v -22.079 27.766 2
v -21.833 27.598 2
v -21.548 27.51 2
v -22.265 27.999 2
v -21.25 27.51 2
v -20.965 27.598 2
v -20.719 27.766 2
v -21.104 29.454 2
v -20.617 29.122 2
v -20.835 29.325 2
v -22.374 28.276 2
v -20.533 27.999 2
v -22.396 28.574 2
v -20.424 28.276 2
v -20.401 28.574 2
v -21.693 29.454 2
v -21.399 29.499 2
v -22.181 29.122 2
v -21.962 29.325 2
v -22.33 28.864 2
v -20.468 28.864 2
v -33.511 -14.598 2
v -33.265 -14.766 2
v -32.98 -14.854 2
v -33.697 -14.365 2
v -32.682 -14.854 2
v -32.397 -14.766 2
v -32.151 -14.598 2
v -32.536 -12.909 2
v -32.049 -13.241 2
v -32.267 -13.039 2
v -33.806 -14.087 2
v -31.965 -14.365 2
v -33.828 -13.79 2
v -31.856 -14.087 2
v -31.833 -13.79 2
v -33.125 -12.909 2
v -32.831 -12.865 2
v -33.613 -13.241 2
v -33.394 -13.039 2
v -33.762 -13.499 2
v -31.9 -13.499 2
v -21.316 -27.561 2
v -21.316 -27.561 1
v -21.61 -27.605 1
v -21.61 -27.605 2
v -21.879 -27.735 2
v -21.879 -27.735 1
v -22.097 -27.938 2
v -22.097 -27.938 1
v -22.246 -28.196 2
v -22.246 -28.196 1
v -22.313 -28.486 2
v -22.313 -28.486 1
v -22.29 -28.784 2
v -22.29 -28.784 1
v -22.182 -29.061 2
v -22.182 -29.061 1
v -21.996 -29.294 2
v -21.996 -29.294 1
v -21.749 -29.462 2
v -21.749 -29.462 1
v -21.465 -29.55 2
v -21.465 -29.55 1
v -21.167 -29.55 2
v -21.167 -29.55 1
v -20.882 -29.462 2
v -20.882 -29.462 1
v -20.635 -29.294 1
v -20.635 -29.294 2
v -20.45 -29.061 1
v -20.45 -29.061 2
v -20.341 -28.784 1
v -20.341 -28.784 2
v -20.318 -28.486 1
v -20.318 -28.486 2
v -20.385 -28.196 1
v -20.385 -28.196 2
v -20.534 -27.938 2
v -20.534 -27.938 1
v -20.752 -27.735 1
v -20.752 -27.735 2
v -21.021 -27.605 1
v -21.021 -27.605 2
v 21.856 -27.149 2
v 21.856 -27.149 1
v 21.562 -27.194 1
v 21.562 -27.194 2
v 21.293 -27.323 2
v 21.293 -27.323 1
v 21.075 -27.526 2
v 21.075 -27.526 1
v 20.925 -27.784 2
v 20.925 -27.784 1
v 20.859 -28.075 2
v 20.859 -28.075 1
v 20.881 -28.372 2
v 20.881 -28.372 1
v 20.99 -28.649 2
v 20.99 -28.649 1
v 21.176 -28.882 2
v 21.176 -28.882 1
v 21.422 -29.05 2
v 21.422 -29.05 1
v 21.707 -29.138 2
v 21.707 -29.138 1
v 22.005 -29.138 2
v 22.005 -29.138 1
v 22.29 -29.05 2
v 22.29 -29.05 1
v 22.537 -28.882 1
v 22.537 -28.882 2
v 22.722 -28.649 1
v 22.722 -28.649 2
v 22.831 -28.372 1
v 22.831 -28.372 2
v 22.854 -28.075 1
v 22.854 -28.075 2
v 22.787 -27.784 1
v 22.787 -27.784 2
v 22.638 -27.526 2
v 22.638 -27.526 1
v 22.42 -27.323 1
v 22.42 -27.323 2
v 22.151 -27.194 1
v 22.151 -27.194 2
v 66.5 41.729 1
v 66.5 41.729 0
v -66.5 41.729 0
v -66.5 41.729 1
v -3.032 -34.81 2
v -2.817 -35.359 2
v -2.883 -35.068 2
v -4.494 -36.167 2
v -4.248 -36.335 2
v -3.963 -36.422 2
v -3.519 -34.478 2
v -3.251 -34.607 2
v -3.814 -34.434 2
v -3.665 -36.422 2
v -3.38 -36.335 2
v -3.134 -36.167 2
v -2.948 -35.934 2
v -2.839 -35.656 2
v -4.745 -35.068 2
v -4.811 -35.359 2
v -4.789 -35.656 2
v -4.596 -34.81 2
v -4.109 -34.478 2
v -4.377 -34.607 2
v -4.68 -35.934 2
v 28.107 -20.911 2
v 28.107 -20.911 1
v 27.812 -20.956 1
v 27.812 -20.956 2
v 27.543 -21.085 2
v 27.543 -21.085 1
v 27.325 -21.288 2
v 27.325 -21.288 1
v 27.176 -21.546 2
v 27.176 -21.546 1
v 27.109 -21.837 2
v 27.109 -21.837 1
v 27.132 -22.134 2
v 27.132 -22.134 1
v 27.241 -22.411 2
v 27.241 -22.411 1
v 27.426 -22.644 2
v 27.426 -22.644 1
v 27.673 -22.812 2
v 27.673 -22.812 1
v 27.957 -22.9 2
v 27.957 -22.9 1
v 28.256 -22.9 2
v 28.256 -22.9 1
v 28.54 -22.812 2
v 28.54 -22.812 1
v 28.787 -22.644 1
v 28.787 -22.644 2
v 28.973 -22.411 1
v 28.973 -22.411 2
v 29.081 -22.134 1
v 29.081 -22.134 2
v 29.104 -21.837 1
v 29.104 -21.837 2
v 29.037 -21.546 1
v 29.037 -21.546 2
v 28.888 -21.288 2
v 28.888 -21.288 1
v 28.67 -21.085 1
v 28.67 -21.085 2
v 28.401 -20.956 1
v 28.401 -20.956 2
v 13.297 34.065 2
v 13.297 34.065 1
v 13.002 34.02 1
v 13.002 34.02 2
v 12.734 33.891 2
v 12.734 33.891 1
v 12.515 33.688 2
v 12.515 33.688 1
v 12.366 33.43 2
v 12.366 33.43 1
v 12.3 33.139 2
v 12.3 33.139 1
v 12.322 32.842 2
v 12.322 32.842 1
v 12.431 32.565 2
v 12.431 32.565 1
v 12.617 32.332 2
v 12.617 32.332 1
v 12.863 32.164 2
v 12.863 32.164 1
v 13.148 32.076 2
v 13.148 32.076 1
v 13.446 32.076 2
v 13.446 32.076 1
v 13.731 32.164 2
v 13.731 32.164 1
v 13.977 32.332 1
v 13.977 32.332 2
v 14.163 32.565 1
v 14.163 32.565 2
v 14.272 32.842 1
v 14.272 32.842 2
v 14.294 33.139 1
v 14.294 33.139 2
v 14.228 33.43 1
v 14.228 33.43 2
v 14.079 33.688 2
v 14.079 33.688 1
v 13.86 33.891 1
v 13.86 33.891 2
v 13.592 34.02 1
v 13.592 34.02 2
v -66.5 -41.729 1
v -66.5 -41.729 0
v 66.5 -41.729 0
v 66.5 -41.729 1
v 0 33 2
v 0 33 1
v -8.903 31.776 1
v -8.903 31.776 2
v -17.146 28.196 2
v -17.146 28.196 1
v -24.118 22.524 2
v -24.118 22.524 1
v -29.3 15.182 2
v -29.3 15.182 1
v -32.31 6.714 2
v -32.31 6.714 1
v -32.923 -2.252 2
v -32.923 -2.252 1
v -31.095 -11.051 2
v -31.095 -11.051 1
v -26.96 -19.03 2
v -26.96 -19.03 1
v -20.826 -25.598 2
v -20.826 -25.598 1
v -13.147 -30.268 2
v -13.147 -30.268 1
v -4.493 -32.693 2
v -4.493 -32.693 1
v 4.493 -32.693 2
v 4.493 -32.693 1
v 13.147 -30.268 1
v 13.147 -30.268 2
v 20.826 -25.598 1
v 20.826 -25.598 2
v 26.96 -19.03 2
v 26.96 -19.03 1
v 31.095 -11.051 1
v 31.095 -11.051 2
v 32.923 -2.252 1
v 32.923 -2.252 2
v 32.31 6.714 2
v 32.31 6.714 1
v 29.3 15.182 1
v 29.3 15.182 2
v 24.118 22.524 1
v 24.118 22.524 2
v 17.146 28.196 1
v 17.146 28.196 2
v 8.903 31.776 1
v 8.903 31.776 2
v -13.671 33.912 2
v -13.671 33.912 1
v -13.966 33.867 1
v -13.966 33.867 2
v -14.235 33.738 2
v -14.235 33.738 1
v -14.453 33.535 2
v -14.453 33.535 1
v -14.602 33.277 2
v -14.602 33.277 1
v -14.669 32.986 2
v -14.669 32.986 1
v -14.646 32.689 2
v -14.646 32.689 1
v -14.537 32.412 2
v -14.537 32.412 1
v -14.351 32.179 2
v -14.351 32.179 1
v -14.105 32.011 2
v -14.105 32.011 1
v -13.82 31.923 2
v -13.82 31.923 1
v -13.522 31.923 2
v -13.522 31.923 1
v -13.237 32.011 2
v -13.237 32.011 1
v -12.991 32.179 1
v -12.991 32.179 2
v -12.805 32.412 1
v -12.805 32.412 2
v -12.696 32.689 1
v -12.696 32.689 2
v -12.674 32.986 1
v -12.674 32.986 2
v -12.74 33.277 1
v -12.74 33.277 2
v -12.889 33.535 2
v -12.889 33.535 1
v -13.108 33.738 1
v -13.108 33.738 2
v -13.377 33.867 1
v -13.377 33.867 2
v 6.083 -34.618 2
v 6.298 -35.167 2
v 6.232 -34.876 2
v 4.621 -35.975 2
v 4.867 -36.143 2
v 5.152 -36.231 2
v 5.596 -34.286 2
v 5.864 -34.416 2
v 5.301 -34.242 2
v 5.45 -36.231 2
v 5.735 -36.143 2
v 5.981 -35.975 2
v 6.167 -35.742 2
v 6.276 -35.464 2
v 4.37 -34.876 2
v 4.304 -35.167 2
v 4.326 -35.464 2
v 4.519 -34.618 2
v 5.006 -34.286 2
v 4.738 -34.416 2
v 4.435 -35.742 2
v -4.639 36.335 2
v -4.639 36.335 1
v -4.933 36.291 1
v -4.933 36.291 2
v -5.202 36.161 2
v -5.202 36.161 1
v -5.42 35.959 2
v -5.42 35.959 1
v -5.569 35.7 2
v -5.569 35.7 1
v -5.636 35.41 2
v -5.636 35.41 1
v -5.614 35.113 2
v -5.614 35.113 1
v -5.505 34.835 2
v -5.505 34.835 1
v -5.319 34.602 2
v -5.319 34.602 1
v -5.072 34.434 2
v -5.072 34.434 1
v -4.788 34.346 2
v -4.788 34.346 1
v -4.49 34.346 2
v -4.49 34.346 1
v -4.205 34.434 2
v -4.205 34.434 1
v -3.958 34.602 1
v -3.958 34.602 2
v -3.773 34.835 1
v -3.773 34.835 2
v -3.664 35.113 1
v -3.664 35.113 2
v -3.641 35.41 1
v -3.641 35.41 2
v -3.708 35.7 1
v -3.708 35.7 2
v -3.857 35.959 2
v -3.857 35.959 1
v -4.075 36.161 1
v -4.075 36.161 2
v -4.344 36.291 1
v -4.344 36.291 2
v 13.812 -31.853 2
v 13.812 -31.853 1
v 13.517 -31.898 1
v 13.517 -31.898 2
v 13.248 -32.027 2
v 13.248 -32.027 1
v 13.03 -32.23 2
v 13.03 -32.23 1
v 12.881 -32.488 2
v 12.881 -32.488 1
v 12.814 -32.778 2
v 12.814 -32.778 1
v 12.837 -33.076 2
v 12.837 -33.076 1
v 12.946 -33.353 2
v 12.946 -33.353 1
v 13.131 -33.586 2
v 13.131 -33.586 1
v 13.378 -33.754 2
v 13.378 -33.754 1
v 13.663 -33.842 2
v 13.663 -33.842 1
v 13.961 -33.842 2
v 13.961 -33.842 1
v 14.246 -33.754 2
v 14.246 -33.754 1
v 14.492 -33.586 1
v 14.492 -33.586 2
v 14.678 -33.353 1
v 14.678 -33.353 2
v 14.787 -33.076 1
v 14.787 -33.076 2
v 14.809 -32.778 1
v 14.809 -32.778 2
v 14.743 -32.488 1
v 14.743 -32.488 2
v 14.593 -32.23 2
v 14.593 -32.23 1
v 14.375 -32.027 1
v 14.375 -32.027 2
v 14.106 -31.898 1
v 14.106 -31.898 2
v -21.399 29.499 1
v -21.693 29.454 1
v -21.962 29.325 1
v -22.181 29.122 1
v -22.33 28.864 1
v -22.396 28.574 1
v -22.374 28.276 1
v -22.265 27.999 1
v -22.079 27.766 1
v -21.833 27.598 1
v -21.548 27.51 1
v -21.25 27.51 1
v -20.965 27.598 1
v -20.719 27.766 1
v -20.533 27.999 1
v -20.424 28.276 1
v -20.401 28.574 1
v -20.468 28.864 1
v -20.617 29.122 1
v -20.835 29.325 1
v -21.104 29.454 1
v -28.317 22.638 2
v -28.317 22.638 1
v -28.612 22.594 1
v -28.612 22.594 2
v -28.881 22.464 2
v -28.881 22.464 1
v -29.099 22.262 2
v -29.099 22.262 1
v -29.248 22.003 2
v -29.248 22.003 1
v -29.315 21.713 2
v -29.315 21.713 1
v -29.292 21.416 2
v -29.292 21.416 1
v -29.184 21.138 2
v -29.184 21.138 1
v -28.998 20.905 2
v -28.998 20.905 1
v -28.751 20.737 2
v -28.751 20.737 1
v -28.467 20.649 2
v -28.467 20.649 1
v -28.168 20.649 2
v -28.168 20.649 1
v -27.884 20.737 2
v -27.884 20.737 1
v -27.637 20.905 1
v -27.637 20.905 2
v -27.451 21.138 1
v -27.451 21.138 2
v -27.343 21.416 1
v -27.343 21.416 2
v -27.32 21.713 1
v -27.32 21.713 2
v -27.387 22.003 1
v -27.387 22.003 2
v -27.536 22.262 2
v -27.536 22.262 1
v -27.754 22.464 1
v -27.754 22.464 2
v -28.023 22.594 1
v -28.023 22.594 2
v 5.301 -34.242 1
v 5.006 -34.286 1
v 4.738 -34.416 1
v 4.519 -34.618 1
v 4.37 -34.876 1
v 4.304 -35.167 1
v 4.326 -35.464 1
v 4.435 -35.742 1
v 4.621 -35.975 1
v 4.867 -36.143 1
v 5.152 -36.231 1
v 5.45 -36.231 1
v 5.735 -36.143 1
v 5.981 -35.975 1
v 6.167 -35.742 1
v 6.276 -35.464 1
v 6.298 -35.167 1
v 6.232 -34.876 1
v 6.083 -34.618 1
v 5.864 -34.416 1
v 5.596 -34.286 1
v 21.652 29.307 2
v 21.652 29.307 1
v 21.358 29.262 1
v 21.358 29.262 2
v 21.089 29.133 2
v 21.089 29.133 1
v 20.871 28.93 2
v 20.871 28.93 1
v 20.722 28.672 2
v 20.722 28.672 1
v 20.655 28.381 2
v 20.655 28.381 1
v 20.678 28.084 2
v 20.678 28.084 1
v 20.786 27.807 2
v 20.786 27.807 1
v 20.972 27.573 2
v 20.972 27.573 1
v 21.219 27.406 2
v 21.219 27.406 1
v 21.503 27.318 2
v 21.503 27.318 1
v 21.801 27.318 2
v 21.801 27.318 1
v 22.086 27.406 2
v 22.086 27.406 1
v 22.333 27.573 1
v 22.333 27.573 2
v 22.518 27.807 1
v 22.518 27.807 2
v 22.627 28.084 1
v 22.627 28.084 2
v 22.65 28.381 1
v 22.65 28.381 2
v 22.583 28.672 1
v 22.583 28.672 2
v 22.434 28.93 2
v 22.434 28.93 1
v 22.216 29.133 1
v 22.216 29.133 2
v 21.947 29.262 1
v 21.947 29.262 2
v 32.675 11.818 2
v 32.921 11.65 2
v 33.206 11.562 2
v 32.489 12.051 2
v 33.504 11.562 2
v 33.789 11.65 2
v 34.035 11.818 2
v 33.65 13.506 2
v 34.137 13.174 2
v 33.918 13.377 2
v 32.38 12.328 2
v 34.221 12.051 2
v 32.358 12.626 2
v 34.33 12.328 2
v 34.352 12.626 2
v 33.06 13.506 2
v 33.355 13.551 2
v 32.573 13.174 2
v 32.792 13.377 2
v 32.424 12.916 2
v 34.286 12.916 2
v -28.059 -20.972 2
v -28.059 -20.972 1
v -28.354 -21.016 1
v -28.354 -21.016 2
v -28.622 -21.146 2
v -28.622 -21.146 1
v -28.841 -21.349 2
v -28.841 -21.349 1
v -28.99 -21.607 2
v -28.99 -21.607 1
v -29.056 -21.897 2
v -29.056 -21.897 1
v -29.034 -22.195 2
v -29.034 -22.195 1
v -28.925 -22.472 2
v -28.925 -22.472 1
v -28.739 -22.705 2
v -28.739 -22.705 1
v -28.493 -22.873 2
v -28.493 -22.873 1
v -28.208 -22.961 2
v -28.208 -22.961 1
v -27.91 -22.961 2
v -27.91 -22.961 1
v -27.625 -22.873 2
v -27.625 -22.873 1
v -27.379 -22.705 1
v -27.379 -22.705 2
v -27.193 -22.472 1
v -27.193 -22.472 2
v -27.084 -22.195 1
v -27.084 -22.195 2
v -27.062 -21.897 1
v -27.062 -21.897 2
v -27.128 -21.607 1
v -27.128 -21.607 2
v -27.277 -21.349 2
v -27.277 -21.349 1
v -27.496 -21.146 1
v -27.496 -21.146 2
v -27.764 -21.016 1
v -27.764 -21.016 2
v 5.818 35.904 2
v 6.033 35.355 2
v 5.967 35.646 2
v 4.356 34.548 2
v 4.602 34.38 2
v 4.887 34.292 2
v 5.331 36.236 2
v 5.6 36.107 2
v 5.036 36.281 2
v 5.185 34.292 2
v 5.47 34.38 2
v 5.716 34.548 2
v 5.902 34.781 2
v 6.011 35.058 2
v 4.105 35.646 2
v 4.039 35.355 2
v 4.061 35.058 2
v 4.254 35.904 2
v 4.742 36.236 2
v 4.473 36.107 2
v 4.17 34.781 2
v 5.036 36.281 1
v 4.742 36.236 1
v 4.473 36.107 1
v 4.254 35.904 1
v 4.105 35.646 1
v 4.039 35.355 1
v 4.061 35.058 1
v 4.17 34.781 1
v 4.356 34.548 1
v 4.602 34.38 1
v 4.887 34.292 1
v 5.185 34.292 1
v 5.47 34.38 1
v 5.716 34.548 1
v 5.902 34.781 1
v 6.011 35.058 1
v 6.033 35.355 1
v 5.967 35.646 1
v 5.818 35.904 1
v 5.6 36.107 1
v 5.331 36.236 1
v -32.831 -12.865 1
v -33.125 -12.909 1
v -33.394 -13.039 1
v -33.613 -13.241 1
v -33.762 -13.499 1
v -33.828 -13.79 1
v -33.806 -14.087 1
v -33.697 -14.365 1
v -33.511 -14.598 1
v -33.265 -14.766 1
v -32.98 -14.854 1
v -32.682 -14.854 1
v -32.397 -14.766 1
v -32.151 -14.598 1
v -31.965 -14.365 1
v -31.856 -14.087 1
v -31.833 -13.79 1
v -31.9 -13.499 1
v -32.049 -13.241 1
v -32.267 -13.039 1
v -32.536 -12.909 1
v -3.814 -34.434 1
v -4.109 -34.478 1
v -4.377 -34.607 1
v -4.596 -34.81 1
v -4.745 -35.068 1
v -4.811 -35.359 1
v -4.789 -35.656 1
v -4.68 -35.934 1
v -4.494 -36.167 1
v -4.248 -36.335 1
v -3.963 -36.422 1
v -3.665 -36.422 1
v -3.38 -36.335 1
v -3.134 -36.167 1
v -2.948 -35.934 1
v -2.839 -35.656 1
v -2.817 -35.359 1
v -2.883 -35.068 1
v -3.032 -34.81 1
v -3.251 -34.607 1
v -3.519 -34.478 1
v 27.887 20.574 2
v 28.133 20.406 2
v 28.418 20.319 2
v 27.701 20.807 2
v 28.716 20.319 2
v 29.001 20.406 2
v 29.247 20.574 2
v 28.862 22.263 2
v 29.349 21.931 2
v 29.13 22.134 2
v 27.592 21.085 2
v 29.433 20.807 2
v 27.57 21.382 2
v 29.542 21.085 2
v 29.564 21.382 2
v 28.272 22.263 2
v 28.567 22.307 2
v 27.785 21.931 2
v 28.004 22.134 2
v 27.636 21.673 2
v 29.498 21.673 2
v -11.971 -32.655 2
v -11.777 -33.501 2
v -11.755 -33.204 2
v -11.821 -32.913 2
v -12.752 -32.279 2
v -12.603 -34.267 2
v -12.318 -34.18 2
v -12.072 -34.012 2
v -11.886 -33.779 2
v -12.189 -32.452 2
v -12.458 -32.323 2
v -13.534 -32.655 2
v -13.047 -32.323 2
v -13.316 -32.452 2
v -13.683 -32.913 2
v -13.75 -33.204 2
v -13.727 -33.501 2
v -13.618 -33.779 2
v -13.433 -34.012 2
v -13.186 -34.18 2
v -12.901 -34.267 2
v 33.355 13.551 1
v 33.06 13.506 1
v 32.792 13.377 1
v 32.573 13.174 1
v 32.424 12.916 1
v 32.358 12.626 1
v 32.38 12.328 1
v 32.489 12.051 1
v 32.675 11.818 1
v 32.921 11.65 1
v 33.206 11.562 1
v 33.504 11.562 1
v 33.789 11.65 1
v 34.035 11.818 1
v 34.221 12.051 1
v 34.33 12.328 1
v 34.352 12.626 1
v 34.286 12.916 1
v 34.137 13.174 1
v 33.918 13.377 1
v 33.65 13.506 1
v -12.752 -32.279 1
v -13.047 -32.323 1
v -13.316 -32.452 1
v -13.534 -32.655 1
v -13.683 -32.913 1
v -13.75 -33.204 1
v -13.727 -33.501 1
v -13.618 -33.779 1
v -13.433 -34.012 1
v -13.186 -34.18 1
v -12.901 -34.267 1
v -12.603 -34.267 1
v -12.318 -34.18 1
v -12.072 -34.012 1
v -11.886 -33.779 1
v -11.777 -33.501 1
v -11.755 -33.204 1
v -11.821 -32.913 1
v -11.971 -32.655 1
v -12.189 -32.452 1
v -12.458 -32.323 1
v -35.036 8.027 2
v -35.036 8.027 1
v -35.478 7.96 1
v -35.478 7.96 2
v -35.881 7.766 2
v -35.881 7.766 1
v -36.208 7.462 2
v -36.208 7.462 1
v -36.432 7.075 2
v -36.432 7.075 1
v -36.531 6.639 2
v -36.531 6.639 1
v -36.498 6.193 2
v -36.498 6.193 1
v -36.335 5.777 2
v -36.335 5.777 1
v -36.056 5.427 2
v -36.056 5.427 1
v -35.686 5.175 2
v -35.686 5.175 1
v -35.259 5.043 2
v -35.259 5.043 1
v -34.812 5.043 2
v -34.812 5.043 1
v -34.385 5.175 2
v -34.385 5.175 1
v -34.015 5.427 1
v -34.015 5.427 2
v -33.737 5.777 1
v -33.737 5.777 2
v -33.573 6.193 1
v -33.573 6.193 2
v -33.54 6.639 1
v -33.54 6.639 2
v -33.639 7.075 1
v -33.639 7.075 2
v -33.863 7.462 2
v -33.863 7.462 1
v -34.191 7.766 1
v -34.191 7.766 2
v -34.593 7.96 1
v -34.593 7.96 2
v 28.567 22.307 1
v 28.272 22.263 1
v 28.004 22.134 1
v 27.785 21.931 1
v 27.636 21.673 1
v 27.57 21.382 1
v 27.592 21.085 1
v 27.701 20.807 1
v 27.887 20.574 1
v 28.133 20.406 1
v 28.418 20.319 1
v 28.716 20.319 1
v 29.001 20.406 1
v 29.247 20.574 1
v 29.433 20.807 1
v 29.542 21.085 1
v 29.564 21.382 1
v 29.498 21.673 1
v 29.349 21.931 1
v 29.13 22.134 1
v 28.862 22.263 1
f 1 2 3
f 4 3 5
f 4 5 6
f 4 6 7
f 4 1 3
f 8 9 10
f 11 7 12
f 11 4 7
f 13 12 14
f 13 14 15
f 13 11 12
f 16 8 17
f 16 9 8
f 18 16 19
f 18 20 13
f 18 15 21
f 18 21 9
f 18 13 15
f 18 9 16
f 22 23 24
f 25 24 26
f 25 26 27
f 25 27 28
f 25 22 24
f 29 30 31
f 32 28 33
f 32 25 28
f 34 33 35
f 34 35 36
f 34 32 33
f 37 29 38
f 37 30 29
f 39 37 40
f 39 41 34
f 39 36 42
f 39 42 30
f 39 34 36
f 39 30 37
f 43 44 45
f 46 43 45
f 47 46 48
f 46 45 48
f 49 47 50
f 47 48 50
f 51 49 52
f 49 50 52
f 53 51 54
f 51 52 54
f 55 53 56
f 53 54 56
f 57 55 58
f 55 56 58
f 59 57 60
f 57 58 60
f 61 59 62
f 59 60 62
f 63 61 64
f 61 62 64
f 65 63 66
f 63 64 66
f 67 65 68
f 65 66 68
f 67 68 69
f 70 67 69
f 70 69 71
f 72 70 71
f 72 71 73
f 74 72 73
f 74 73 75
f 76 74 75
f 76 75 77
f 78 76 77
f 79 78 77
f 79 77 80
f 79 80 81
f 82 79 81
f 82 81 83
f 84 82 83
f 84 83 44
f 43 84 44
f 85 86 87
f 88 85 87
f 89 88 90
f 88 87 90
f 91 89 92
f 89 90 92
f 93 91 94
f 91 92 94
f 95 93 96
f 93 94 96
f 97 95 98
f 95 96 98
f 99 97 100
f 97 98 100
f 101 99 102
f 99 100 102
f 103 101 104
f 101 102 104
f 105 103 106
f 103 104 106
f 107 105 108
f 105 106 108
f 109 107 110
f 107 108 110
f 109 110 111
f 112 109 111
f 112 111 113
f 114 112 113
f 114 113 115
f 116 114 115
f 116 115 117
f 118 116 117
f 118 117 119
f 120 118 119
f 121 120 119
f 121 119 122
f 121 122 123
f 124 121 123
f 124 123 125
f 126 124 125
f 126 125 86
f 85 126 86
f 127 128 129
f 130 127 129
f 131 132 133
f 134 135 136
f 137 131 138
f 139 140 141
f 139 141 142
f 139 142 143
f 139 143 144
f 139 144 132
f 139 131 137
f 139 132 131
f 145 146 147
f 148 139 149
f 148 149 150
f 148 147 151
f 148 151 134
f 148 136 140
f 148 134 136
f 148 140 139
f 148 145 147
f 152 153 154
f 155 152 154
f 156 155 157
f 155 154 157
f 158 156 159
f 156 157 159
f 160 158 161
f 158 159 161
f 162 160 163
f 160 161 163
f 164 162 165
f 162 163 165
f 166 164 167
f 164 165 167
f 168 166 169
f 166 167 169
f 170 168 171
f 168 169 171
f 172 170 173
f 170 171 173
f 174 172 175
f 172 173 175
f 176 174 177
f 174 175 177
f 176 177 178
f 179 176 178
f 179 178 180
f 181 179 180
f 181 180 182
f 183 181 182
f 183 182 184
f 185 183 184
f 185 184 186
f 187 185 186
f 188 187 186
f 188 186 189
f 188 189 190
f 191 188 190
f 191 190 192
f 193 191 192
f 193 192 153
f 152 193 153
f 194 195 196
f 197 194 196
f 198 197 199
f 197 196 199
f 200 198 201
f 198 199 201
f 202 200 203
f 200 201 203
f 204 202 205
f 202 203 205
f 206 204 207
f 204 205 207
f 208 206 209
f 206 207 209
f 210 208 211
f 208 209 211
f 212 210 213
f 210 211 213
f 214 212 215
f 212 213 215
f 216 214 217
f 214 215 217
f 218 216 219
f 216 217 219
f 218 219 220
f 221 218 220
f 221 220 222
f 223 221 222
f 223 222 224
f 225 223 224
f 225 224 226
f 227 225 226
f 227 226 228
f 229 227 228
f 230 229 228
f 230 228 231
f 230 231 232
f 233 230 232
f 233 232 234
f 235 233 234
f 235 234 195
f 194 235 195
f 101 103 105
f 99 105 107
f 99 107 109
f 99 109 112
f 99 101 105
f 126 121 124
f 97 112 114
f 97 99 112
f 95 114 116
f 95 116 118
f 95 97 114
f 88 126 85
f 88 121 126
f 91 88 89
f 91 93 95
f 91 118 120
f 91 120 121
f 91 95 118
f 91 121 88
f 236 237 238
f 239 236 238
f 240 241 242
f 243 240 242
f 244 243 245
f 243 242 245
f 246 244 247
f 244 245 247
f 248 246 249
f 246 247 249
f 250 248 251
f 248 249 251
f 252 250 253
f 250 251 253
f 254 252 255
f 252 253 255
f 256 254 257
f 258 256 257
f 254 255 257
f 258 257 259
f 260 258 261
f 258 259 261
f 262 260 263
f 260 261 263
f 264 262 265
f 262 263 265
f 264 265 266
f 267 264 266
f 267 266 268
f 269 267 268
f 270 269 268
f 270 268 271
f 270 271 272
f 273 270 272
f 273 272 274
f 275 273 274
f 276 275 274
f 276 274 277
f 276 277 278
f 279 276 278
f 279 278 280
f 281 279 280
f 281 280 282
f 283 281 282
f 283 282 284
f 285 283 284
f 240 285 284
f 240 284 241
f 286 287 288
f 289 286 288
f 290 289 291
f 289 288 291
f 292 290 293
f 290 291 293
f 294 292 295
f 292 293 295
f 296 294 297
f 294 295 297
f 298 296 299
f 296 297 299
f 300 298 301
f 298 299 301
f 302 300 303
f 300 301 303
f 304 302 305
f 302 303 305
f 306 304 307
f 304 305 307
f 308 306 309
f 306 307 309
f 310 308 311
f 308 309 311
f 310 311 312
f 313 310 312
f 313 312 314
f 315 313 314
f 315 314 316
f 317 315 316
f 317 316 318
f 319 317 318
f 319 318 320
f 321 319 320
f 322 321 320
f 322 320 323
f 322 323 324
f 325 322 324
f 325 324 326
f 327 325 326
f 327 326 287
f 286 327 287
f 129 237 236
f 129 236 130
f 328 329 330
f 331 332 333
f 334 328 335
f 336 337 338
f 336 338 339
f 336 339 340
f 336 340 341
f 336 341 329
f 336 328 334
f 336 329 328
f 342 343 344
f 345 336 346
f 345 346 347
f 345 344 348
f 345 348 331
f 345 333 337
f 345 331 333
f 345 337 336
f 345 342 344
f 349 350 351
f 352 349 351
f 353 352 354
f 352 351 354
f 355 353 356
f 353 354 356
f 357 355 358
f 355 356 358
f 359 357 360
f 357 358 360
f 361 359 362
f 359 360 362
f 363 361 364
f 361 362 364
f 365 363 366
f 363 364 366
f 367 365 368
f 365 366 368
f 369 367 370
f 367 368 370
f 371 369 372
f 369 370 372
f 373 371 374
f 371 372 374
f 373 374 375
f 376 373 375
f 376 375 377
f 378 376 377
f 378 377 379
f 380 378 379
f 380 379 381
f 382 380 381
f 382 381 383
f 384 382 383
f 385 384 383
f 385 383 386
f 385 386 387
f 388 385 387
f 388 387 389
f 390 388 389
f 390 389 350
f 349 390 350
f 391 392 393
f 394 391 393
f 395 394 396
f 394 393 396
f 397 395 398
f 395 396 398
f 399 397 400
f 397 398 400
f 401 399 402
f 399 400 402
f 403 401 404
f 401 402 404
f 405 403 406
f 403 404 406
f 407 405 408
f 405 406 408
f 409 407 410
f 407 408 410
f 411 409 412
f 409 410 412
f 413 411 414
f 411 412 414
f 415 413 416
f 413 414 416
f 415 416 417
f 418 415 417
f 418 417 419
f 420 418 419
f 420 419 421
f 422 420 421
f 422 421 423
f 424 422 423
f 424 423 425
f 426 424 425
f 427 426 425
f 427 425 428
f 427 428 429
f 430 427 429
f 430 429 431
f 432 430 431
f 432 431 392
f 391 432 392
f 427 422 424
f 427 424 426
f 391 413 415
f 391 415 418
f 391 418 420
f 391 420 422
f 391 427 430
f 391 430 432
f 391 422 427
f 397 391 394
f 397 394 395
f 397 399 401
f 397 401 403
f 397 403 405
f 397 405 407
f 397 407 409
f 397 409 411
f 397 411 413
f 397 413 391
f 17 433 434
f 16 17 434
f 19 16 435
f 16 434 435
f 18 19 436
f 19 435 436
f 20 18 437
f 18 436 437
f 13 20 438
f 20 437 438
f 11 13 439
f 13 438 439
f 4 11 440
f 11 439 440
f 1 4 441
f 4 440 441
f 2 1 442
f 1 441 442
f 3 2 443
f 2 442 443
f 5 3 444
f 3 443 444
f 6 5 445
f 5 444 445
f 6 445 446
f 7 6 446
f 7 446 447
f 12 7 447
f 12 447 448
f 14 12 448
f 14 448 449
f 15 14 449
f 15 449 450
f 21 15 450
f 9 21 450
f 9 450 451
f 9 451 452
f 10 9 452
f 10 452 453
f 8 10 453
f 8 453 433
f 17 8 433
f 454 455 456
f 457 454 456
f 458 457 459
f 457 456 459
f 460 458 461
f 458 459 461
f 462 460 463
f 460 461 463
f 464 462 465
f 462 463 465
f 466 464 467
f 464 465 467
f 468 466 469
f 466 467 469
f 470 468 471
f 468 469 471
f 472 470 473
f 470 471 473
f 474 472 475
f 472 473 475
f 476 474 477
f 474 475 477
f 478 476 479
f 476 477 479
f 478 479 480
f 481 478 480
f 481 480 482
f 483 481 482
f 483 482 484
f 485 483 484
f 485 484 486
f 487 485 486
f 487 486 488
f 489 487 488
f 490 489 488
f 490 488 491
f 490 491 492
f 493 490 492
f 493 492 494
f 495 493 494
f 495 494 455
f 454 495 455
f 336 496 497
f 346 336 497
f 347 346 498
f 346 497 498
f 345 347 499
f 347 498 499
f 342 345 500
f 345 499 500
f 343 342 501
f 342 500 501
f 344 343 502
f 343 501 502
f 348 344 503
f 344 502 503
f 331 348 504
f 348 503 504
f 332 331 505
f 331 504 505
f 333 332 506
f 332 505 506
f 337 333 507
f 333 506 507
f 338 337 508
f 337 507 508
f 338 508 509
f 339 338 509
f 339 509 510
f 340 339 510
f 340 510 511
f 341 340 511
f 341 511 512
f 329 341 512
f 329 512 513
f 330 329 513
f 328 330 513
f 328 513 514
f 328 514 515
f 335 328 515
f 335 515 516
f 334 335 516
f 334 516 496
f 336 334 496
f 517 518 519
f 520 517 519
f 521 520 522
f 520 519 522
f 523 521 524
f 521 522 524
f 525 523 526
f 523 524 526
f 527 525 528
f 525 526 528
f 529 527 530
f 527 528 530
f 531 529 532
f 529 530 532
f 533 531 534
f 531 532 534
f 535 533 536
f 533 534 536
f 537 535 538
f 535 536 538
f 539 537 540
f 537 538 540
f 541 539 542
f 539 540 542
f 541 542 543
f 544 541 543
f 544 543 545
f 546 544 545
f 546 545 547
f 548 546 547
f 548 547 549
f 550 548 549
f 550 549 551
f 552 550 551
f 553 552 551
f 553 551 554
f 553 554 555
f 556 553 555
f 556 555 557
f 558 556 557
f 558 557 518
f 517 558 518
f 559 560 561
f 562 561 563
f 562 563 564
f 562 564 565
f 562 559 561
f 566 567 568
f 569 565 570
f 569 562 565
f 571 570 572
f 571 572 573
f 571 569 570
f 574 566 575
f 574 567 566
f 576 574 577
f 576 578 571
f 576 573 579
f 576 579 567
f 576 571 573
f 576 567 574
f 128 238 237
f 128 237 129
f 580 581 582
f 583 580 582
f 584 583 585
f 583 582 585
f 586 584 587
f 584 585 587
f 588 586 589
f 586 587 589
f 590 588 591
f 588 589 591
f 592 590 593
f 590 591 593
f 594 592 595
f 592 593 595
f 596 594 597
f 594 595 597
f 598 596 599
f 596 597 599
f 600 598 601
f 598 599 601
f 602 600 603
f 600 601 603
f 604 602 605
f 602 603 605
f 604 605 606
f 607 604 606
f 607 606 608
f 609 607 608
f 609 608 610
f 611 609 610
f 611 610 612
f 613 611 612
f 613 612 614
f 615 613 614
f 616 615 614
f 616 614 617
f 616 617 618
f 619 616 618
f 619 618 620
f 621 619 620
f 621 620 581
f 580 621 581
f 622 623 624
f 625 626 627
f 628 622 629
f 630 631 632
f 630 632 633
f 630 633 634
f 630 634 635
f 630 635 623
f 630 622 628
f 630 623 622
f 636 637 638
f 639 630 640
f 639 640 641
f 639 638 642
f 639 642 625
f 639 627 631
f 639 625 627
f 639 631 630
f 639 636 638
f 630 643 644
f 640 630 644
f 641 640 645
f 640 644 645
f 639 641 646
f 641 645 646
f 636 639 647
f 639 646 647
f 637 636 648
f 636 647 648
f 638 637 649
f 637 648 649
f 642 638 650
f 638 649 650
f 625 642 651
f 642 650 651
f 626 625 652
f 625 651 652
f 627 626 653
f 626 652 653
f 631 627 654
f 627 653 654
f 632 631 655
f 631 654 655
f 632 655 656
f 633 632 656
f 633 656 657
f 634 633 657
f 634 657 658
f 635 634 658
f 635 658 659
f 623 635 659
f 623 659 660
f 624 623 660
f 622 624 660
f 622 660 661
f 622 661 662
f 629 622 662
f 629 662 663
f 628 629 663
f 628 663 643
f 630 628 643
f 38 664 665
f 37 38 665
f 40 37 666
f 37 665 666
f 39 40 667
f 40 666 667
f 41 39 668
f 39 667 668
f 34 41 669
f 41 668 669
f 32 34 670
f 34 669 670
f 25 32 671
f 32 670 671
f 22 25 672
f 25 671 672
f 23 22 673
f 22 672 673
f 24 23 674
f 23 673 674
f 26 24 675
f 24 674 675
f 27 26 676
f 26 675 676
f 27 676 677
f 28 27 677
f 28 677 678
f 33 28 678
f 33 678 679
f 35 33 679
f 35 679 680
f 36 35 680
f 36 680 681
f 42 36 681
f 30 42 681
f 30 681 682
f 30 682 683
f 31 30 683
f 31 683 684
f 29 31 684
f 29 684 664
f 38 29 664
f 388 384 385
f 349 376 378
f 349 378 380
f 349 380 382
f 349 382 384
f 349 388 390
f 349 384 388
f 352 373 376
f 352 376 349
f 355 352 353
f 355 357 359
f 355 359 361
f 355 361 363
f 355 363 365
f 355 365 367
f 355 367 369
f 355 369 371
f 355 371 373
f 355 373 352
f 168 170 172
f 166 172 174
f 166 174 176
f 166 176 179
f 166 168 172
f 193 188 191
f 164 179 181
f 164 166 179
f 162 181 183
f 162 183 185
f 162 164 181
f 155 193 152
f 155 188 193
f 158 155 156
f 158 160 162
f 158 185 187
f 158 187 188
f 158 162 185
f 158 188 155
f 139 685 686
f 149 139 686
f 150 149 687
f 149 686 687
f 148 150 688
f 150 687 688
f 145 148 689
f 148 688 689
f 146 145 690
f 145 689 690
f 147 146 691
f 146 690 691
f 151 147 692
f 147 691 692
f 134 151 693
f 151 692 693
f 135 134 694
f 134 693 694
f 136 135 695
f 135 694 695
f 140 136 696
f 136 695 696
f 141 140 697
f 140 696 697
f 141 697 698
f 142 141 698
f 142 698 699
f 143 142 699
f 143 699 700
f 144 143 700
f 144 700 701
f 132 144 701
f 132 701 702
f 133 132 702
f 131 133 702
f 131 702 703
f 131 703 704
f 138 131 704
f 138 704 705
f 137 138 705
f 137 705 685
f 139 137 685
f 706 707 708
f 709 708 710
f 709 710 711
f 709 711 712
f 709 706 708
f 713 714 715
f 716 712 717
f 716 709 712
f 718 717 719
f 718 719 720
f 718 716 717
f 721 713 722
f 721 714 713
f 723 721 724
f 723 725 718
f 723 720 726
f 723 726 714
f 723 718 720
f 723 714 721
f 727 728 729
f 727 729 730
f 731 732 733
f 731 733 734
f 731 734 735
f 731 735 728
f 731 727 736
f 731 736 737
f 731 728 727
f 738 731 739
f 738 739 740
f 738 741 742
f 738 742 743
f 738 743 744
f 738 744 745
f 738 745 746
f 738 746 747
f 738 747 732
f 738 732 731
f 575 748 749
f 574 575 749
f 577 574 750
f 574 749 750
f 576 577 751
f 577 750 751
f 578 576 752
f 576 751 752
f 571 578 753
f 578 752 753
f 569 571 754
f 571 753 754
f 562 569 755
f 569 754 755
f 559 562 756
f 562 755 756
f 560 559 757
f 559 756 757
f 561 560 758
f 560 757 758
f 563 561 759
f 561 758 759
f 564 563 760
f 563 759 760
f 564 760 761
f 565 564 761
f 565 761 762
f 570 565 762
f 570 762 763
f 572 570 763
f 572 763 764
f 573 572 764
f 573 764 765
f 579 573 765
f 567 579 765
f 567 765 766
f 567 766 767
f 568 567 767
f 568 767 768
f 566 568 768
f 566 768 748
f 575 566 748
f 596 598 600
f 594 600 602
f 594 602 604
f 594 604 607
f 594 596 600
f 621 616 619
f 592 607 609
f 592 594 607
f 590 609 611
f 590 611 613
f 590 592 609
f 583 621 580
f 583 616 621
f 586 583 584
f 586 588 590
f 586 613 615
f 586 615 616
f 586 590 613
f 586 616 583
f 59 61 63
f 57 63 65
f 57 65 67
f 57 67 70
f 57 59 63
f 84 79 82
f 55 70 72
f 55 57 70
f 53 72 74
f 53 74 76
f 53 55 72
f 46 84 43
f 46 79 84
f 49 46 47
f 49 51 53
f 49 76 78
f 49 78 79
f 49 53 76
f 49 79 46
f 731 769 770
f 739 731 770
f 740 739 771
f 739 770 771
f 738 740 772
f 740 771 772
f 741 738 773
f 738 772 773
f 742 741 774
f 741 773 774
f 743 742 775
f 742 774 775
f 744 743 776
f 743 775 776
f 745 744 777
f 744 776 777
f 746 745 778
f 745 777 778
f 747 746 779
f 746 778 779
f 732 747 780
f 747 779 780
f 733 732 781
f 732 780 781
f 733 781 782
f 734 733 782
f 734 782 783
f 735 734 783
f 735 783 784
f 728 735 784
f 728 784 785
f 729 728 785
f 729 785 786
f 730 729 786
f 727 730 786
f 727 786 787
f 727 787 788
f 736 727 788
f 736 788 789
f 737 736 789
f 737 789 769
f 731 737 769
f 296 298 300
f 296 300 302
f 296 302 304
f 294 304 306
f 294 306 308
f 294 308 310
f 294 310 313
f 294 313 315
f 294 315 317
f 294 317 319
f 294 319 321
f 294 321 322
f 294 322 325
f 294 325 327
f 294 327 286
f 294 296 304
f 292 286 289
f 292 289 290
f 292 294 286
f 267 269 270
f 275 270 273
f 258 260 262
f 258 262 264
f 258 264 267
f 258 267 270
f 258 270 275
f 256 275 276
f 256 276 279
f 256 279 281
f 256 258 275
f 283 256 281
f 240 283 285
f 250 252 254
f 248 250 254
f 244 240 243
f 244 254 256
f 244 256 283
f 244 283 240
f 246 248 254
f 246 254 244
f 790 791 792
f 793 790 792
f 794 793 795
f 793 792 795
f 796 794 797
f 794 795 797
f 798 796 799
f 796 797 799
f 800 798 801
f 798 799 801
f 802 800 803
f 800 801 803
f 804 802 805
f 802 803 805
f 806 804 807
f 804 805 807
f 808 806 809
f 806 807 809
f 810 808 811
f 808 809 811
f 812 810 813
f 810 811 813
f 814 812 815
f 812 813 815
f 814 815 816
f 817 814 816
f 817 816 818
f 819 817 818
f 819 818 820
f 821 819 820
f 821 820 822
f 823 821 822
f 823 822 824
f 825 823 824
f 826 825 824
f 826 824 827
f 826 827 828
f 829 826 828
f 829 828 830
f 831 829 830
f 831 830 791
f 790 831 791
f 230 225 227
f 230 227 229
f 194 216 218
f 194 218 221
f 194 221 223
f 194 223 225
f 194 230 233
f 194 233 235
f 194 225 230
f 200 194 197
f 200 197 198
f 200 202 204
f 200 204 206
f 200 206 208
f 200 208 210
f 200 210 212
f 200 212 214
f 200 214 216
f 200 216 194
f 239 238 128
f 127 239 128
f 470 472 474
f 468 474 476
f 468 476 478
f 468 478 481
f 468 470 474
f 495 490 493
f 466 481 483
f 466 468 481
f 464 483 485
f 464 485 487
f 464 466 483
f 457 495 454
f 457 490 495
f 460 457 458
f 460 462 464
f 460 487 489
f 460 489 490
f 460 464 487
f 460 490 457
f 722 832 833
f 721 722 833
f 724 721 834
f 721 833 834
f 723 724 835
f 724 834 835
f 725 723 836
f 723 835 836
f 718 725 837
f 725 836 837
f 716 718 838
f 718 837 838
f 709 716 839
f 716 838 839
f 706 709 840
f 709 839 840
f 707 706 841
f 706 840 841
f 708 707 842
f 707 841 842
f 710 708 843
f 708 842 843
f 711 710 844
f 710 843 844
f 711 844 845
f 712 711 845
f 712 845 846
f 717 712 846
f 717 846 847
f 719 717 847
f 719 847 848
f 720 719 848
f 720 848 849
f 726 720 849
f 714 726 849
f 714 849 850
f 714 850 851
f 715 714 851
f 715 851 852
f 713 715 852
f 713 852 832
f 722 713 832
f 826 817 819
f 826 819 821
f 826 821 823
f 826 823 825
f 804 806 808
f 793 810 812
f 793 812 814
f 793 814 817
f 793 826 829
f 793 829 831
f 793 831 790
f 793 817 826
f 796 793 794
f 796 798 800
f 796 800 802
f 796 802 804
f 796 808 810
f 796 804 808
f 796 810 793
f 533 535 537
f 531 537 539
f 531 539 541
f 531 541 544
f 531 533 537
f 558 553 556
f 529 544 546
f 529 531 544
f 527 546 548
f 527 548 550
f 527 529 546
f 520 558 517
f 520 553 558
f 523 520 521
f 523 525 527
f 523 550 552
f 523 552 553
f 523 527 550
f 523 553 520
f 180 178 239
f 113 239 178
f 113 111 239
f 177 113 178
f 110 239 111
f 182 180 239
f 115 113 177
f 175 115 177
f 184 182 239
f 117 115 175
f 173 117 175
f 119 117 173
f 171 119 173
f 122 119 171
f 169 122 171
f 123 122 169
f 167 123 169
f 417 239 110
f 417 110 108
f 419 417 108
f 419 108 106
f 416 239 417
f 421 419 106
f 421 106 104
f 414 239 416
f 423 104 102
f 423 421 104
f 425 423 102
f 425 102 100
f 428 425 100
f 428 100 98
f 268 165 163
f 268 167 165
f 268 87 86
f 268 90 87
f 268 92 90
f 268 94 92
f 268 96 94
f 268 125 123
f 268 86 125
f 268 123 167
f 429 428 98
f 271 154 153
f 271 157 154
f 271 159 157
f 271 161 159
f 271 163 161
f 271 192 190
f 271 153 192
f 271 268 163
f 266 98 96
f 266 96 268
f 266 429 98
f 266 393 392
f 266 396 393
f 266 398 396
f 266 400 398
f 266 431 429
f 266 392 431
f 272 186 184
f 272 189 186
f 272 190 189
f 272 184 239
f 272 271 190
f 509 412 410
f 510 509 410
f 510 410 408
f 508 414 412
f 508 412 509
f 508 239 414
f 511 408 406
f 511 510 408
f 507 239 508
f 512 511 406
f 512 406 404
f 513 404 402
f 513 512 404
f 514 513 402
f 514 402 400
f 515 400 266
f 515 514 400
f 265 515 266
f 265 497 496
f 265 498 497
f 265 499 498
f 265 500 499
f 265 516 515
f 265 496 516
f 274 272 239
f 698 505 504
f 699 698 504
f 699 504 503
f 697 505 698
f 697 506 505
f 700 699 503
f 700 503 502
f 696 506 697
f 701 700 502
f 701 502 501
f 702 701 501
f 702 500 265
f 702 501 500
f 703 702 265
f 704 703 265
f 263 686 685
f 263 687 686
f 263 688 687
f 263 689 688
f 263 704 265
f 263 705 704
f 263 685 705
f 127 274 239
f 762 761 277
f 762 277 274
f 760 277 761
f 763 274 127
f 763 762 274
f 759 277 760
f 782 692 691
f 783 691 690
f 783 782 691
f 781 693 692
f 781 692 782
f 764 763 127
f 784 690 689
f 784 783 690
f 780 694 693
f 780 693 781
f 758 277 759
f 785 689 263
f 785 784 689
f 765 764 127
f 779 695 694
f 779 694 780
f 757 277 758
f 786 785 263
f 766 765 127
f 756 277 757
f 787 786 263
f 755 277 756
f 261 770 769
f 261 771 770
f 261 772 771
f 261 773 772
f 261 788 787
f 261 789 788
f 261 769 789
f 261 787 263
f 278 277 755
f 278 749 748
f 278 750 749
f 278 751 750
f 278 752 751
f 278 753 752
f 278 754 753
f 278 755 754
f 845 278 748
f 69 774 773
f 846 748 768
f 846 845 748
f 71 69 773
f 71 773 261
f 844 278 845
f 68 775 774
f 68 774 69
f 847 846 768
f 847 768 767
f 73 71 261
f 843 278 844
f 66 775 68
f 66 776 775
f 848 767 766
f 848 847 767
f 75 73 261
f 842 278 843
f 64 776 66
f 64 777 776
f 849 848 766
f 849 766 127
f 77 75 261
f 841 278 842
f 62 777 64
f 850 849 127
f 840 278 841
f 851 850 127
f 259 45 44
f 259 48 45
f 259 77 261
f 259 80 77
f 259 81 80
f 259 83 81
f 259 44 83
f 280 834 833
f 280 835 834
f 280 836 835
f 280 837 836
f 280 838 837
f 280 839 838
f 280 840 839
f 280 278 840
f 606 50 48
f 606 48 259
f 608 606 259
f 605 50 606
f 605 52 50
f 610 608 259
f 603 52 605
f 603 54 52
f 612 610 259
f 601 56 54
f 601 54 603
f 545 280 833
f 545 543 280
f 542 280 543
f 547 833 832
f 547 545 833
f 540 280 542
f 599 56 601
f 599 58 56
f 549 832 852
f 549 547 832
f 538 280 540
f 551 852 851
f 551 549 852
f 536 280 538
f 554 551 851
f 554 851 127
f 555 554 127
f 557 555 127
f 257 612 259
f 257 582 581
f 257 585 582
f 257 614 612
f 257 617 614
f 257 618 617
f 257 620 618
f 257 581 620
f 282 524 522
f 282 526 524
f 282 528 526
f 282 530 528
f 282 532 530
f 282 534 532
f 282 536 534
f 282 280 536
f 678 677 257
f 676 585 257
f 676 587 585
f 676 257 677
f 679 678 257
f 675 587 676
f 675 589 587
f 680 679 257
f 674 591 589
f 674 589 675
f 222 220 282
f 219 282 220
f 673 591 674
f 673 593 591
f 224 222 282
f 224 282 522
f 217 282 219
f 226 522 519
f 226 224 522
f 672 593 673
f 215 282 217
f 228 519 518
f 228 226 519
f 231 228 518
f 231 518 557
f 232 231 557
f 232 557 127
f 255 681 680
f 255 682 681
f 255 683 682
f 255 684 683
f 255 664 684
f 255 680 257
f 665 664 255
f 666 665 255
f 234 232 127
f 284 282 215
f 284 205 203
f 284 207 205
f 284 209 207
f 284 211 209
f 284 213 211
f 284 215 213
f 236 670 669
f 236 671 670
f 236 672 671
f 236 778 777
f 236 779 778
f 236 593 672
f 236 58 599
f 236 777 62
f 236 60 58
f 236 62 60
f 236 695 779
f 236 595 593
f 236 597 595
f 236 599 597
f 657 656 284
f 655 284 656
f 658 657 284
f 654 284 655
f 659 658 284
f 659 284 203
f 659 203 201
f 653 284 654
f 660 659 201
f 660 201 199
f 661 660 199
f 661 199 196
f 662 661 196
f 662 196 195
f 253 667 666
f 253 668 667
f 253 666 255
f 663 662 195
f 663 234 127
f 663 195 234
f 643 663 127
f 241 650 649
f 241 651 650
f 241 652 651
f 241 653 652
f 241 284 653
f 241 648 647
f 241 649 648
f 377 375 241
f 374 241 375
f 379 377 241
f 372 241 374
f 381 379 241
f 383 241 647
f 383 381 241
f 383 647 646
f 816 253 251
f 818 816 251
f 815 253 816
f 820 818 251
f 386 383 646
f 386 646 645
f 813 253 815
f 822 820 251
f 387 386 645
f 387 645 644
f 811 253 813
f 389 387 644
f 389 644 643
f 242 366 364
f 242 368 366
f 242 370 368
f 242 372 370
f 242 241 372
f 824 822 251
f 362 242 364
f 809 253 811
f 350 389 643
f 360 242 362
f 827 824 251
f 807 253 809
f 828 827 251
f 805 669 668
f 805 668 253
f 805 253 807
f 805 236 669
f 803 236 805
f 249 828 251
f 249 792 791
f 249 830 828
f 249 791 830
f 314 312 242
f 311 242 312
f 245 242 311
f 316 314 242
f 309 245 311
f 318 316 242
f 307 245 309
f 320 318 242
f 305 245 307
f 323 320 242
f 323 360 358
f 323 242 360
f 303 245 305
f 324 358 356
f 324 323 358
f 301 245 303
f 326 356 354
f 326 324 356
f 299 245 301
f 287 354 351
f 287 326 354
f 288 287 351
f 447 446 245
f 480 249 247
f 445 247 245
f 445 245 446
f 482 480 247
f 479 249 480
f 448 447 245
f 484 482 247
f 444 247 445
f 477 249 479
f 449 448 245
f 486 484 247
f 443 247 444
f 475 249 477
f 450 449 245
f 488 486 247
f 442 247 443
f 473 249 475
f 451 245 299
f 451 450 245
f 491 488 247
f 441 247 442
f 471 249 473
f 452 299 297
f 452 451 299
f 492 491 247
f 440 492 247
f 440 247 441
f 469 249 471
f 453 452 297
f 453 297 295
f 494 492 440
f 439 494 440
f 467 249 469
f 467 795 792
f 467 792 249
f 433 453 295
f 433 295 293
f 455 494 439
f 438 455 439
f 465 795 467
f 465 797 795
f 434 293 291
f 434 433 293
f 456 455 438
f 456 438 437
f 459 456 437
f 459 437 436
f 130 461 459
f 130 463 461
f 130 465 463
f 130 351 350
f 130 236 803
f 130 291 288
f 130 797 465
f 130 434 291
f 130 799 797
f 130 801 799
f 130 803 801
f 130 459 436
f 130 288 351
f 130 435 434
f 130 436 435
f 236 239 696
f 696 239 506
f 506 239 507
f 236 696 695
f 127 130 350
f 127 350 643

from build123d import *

# Parameters (mm, degrees)
F0_W     = 83.4575
F0_H     = 24.77125
F0_H_2   = 83.4575
F0_R     = 1
F0_R_2   = 33
F0_R_3   = 1.5
F1_DEPTH = 1
F2_DEPTH = 2
F3_ANGLE = 90


with BuildPart() as f1:
    # F0 (on Top) → F1 (new body)
    with BuildSketch(Plane.XY):
        with Locations((0, 54.114375)):
            Rectangle(F0_W, F0_H)
        with Locations((0, -54.114375)):
            Rectangle(F0_W, F0_H)
        Rectangle(F0_W, F0_H_2)
        with Locations((-35.241835, -5.300909)):
            Circle(F0_R, mode=Mode.SUBTRACT)
        with Locations((-21.911398, -28.106533)):
            Circle(F0_R, mode=Mode.SUBTRACT)
        with Locations((-28.14937, -21.856339)):
            Circle(F0_R, mode=Mode.SUBTRACT)
        with Locations((-32.853084, -13.811641)):
            Circle(F0_R, mode=Mode.SUBTRACT)
        with Locations((12.550777, -33.355128)):
            Circle(F0_R, mode=Mode.SUBTRACT)
        with Locations((21.307442, -28.567105)):
            Circle(F0_R, mode=Mode.SUBTRACT)
        with Locations((28.306502, -21.652449)):
            Circle(F0_R, mode=Mode.SUBTRACT)
        with Locations((33.0647, -13.297075)):
            Circle(F0_R, mode=Mode.SUBTRACT)
        with Locations((35.280626, -5.036269)):
            Circle(F0_R, mode=Mode.SUBTRACT)
        with Locations((-35.433602, 3.81398)):
            Circle(F0_R, mode=Mode.SUBTRACT)
        with Locations((-33.27858, 12.752359)):
            Circle(F0_R, mode=Mode.SUBTRACT)
        with Locations((-28.561056, 21.31555)):
            Circle(F0_R, mode=Mode.SUBTRACT)
        with Locations((-21.972067, 28.059131)):
            Circle(F0_R, mode=Mode.SUBTRACT)
        with Locations((-13.864813, 32.83068)):
            Circle(F0_R, mode=Mode.SUBTRACT)
        Circle(F0_R_2, mode=Mode.SUBTRACT)
        with Locations((32.911723, 13.671321)):
            Circle(F0_R, mode=Mode.SUBTRACT)
        with Locations((28.498819, 21.398689)):
            Circle(F0_R, mode=Mode.SUBTRACT)
        with Locations((21.63808, 28.317487)):
            Circle(F0_R, mode=Mode.SUBTRACT)
        with Locations((35.335113, 4.638577)):
            Circle(F0_R, mode=Mode.SUBTRACT)
        with Locations((6.526564, 35.035561)):
            Circle(F0_R_3, mode=Mode.SUBTRACT)
    extrude(amount=F1_DEPTH)

    # F0 (on Top) → F2 (join)
    with BuildSketch(Plane.XY):
        Circle(F0_R_2)
        with Locations((-13.864813, 32.83068)):
            Circle(F0_R)
        with Locations((-21.972067, 28.059131)):
            Circle(F0_R)
        with Locations((-28.561056, 21.31555)):
            Circle(F0_R)
        with Locations((-33.27858, 12.752359)):
            Circle(F0_R)
        with Locations((-35.433602, 3.81398)):
            Circle(F0_R)
        with Locations((-35.241835, -5.300909)):
            Circle(F0_R)
        with Locations((-32.853084, -13.811641)):
            Circle(F0_R)
        with Locations((-28.14937, -21.856339)):
            Circle(F0_R)
        with Locations((-21.911398, -28.106533)):
            Circle(F0_R)
        with Locations((12.550777, -33.355128)):
            Circle(F0_R)
        with Locations((21.307442, -28.567105)):
            Circle(F0_R)
        with Locations((28.306502, -21.652449)):
            Circle(F0_R)
        with Locations((33.0647, -13.297075)):
            Circle(F0_R)
        with Locations((35.280626, -5.036269)):
            Circle(F0_R)
        with Locations((35.335113, 4.638577)):
            Circle(F0_R)
        with Locations((32.911723, 13.671321)):
            Circle(F0_R)
        with Locations((28.498819, 21.398689)):
            Circle(F0_R)
        with Locations((21.63808, 28.317487)):
            Circle(F0_R)
        with Locations((6.526564, 35.035561)):
            Circle(F0_R_3)
    extrude(amount=F2_DEPTH)


with BuildPart() as f1_1:
    # F3: moved
    add(f1.part.rotate(Axis((0, 0, 2), (0, 0, 1)), F3_ANGLE))


solid = f1_1.part
